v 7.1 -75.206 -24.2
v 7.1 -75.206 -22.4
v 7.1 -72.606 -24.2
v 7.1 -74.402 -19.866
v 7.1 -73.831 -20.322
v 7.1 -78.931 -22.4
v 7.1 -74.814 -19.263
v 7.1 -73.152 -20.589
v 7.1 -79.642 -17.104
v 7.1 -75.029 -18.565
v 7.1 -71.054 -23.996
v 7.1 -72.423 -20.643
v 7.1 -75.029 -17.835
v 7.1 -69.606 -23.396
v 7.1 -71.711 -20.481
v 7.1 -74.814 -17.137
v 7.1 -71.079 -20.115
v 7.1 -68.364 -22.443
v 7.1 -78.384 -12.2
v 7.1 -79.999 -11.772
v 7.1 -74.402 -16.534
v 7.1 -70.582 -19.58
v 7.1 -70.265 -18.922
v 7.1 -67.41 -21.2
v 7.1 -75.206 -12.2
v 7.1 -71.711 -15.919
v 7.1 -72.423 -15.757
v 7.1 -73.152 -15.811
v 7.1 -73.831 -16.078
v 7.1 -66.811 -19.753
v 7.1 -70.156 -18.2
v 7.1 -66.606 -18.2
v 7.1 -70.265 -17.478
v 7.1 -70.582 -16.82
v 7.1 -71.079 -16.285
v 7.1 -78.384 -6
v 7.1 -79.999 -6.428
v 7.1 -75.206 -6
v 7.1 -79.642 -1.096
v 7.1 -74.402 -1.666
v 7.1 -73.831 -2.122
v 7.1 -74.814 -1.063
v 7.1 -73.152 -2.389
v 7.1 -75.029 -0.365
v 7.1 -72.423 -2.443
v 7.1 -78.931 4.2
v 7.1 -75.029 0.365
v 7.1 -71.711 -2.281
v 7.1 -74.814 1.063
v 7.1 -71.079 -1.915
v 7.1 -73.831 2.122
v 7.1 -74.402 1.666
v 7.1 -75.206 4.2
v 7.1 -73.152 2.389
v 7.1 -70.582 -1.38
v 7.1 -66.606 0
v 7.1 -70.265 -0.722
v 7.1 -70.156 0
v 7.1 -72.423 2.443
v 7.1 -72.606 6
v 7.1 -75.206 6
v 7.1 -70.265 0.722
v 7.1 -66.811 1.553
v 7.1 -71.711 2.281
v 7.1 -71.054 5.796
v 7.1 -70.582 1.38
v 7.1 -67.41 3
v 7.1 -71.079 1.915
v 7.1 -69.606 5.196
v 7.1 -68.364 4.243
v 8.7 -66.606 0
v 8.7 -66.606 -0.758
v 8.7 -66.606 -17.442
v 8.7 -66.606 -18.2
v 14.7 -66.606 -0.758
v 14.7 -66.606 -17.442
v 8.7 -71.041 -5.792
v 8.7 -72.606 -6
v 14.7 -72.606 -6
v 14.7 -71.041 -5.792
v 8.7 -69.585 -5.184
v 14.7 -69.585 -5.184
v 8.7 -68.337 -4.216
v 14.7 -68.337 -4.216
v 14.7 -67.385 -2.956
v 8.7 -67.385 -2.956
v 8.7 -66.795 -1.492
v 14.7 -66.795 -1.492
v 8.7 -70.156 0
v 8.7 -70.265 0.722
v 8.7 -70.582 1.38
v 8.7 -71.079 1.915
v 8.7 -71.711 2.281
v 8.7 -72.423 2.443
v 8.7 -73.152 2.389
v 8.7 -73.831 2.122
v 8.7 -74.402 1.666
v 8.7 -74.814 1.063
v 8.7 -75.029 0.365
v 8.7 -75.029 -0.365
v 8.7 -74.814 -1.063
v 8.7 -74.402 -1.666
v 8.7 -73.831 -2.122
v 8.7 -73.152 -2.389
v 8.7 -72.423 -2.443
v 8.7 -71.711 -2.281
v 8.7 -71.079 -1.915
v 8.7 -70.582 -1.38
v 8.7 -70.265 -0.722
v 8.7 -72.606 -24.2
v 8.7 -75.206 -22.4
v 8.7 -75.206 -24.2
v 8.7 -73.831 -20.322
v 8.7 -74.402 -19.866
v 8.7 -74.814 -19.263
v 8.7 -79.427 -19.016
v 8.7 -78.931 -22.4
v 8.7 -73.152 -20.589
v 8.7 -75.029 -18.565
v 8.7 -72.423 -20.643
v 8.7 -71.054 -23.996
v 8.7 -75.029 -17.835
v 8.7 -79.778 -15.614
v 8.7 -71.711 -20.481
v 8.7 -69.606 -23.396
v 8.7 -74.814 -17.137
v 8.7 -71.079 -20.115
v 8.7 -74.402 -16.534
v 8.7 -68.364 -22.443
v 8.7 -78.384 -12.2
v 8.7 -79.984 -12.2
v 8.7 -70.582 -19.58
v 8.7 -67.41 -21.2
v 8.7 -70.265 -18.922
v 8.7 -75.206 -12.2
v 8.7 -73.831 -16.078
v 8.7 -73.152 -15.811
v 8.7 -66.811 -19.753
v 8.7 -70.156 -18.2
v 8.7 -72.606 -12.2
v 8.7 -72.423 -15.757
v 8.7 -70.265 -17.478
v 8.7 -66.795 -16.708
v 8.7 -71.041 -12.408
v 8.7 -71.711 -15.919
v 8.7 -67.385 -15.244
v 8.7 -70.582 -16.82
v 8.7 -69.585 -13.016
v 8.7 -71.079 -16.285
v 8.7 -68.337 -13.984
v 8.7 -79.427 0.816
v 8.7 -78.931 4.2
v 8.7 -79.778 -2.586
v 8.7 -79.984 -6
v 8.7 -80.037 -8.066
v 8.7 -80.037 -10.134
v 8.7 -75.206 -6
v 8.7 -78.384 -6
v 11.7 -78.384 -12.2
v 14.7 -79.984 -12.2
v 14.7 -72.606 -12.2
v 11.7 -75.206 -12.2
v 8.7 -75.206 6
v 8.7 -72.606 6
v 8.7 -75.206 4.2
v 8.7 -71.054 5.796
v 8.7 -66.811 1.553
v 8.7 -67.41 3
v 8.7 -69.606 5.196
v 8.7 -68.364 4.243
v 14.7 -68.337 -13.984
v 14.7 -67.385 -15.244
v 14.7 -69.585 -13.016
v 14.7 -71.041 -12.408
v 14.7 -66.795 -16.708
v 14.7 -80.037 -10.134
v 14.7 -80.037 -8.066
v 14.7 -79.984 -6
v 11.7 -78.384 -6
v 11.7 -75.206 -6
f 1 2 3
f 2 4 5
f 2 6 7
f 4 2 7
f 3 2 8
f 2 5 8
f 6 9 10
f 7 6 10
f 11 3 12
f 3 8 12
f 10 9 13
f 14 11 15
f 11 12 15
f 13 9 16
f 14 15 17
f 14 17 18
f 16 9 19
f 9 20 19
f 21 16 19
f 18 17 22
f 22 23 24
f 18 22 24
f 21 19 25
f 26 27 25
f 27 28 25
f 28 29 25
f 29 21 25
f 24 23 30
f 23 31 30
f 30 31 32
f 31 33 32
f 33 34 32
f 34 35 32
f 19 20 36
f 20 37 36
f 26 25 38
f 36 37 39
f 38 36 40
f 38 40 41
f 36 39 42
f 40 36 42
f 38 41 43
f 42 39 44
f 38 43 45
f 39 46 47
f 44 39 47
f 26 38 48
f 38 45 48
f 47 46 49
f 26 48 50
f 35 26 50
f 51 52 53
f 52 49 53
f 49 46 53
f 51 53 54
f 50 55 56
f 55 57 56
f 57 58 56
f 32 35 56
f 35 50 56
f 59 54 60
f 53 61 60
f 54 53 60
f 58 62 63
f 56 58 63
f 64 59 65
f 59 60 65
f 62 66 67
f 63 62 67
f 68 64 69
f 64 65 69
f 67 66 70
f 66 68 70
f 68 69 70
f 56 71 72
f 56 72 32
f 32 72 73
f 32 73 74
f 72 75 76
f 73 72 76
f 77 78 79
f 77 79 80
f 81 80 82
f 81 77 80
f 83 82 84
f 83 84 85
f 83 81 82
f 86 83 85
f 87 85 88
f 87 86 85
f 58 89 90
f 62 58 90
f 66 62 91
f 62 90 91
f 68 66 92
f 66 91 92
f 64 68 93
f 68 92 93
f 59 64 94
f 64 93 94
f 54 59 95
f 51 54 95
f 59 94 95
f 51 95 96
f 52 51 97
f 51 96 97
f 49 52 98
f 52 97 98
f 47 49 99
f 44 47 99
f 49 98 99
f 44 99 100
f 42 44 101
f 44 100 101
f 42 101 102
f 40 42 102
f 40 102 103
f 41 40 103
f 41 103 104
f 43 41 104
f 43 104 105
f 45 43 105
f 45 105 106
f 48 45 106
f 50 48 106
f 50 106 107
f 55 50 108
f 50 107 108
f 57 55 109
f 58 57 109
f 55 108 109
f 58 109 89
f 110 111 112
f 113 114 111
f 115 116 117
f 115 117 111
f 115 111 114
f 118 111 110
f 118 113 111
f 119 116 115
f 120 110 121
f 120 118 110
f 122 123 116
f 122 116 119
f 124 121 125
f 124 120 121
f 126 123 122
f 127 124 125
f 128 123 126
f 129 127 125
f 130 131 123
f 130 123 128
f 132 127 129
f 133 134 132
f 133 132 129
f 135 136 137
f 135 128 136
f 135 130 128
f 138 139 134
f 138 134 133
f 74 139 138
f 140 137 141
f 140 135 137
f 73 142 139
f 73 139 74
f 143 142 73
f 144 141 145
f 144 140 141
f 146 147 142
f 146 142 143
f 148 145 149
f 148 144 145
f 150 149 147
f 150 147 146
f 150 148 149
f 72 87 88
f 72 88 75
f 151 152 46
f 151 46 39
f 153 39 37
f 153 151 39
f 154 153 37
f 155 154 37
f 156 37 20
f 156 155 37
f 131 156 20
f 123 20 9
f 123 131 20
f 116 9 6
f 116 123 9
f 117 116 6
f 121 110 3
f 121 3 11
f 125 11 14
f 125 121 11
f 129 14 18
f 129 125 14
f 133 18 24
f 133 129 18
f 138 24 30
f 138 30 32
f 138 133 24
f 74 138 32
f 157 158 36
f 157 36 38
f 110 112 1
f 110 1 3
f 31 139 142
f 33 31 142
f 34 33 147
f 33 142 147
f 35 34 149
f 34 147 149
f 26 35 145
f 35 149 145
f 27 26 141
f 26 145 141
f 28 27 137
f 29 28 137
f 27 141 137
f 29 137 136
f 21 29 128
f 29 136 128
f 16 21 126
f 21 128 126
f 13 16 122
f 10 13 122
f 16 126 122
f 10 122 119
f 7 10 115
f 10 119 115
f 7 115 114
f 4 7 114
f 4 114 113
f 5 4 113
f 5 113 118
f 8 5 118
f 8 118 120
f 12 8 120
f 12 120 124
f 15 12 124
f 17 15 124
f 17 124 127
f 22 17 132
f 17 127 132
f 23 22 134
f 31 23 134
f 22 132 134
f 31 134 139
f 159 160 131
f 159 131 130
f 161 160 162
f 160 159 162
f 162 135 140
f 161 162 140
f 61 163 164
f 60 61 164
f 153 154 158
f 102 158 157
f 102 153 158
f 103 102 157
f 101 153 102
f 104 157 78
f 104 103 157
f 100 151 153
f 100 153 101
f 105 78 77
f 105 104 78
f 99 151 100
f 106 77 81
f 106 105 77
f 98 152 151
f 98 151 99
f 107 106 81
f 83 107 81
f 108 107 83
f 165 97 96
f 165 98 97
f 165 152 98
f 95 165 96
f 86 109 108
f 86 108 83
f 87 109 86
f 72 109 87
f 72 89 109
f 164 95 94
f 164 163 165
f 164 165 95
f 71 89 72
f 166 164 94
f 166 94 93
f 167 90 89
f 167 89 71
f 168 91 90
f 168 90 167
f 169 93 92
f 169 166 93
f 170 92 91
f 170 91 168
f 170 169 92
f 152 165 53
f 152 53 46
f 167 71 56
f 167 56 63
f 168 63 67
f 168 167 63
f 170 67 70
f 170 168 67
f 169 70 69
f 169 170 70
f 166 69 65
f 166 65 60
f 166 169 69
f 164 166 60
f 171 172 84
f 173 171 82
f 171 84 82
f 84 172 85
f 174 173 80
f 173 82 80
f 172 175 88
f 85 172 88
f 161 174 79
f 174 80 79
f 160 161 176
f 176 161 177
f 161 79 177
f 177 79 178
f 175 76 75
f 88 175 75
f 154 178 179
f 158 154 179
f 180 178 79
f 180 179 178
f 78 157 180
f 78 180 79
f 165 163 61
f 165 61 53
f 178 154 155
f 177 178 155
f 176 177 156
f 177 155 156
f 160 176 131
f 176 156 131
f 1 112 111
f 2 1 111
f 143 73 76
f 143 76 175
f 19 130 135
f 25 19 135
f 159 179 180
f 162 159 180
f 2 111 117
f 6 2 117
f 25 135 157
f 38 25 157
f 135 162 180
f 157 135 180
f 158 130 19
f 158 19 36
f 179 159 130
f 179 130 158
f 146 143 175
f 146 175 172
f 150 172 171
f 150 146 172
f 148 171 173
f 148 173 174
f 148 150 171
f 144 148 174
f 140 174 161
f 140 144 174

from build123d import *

# Parameters (mm, degrees)
SKETCH007_R          = 2.45
PAD005_DEPTH         = 1.6
PAD006_DEPTH         = 6
SKETCH058_W          = 3.1771358599
SKETCH058_H          = 6.2
POCKET021_DEPTH      = 1.6
POCKET021_DEPTH_BACK = 3


with BuildPart() as part:
    # Sketch007 → Pad005 (new body)
    with BuildSketch(Plane.YZ.offset(8.7)):
        with BuildLine():
            ThreePointArc((-6, 6), (-7.4371881489, -9.1), (-6, -24.2))
            Line((-6, -24.2), (0, -24.2))
            ThreePointArc((0, -24.2), (4.2426406871, -22.4426406871), (6, -18.2))
            Line((6, 0), (6, -18.2))
            ThreePointArc((6, 0), (4.2426406871, 4.2426406871), (0, 6))
            Line((-6, 6), (0, 6))
        make_face()
        Circle(SKETCH007_R, mode=Mode.SUBTRACT)
        with Locations((0, -18.2)):
            Circle(SKETCH007_R, mode=Mode.SUBTRACT)
    extrude(amount=-PAD005_DEPTH)

    # Sketch008 → Pad006 (join)
    with BuildSketch(Plane.YZ.offset(8.7)):
        with BuildLine():
            ThreePointArc((5.8114989668, -16.707860677), (3.6774423219, -13.4590699257), (0, -12.2))
            Line((-7.3771358599, -12.2), (0, -12.2))
            ThreePointArc((-7.3771358599, -6), (-7.4371881489, -9.1), (-7.3771358599, -12.2))
            Line((-7.3771358599, -6), (0, -6))
            ThreePointArc((0, -6), (3.6774423219, -4.7409300743), (5.8114989668, -1.492139323))
            Line((5.8114989668, -1.492139323), (6, -0.7579762707))
            Line((6, -0.7579762707), (6, -17.4420237293))
            Line((6, -17.4420237293), (5.8114989668, -16.707860677))
        make_face()
    extrude(amount=PAD006_DEPTH)

    # Sketch058 → Pocket021 (cut, two sides)
    with BuildSketch(Plane.YZ.offset(8.7)) as pocket021_sk:
        with BuildLine():
            Line((-2.6, 6), (-6, 6))
            ThreePointArc((-6, 6), (-6.167388681, 5.1009268767), (-6.3244944235, 4.2))
            Line((-2.6, 4.2), (-6.3244944235, 4.2))
            Line((-2.6, 6), (-2.6, 4.2))
        make_face()
        with BuildLine():
            Line((-6, -24.2), (-2.6, -24.2))
            Line((-2.6, -24.2), (-2.6, -22.4))
            Line((-2.6, -22.4), (-6.3244944235, -22.4))
            ThreePointArc((-6.3244944235, -22.4), (-6.167388681, -23.3009268767), (-6, -24.2))
        make_face()
        with Locations((-4.18856793, -9.1)):
            Rectangle(SKETCH058_W, SKETCH058_H)
    extrude(amount=-POCKET021_DEPTH, mode=Mode.SUBTRACT)
    extrude(pocket021_sk.sketch, amount=POCKET021_DEPTH_BACK, mode=Mode.SUBTRACT)


with BuildPart() as part_1:
    # Body006 placement: moved
    add(part.part.moved(Location((0, -72.6064407756, 0))))


solid = part_1.part
